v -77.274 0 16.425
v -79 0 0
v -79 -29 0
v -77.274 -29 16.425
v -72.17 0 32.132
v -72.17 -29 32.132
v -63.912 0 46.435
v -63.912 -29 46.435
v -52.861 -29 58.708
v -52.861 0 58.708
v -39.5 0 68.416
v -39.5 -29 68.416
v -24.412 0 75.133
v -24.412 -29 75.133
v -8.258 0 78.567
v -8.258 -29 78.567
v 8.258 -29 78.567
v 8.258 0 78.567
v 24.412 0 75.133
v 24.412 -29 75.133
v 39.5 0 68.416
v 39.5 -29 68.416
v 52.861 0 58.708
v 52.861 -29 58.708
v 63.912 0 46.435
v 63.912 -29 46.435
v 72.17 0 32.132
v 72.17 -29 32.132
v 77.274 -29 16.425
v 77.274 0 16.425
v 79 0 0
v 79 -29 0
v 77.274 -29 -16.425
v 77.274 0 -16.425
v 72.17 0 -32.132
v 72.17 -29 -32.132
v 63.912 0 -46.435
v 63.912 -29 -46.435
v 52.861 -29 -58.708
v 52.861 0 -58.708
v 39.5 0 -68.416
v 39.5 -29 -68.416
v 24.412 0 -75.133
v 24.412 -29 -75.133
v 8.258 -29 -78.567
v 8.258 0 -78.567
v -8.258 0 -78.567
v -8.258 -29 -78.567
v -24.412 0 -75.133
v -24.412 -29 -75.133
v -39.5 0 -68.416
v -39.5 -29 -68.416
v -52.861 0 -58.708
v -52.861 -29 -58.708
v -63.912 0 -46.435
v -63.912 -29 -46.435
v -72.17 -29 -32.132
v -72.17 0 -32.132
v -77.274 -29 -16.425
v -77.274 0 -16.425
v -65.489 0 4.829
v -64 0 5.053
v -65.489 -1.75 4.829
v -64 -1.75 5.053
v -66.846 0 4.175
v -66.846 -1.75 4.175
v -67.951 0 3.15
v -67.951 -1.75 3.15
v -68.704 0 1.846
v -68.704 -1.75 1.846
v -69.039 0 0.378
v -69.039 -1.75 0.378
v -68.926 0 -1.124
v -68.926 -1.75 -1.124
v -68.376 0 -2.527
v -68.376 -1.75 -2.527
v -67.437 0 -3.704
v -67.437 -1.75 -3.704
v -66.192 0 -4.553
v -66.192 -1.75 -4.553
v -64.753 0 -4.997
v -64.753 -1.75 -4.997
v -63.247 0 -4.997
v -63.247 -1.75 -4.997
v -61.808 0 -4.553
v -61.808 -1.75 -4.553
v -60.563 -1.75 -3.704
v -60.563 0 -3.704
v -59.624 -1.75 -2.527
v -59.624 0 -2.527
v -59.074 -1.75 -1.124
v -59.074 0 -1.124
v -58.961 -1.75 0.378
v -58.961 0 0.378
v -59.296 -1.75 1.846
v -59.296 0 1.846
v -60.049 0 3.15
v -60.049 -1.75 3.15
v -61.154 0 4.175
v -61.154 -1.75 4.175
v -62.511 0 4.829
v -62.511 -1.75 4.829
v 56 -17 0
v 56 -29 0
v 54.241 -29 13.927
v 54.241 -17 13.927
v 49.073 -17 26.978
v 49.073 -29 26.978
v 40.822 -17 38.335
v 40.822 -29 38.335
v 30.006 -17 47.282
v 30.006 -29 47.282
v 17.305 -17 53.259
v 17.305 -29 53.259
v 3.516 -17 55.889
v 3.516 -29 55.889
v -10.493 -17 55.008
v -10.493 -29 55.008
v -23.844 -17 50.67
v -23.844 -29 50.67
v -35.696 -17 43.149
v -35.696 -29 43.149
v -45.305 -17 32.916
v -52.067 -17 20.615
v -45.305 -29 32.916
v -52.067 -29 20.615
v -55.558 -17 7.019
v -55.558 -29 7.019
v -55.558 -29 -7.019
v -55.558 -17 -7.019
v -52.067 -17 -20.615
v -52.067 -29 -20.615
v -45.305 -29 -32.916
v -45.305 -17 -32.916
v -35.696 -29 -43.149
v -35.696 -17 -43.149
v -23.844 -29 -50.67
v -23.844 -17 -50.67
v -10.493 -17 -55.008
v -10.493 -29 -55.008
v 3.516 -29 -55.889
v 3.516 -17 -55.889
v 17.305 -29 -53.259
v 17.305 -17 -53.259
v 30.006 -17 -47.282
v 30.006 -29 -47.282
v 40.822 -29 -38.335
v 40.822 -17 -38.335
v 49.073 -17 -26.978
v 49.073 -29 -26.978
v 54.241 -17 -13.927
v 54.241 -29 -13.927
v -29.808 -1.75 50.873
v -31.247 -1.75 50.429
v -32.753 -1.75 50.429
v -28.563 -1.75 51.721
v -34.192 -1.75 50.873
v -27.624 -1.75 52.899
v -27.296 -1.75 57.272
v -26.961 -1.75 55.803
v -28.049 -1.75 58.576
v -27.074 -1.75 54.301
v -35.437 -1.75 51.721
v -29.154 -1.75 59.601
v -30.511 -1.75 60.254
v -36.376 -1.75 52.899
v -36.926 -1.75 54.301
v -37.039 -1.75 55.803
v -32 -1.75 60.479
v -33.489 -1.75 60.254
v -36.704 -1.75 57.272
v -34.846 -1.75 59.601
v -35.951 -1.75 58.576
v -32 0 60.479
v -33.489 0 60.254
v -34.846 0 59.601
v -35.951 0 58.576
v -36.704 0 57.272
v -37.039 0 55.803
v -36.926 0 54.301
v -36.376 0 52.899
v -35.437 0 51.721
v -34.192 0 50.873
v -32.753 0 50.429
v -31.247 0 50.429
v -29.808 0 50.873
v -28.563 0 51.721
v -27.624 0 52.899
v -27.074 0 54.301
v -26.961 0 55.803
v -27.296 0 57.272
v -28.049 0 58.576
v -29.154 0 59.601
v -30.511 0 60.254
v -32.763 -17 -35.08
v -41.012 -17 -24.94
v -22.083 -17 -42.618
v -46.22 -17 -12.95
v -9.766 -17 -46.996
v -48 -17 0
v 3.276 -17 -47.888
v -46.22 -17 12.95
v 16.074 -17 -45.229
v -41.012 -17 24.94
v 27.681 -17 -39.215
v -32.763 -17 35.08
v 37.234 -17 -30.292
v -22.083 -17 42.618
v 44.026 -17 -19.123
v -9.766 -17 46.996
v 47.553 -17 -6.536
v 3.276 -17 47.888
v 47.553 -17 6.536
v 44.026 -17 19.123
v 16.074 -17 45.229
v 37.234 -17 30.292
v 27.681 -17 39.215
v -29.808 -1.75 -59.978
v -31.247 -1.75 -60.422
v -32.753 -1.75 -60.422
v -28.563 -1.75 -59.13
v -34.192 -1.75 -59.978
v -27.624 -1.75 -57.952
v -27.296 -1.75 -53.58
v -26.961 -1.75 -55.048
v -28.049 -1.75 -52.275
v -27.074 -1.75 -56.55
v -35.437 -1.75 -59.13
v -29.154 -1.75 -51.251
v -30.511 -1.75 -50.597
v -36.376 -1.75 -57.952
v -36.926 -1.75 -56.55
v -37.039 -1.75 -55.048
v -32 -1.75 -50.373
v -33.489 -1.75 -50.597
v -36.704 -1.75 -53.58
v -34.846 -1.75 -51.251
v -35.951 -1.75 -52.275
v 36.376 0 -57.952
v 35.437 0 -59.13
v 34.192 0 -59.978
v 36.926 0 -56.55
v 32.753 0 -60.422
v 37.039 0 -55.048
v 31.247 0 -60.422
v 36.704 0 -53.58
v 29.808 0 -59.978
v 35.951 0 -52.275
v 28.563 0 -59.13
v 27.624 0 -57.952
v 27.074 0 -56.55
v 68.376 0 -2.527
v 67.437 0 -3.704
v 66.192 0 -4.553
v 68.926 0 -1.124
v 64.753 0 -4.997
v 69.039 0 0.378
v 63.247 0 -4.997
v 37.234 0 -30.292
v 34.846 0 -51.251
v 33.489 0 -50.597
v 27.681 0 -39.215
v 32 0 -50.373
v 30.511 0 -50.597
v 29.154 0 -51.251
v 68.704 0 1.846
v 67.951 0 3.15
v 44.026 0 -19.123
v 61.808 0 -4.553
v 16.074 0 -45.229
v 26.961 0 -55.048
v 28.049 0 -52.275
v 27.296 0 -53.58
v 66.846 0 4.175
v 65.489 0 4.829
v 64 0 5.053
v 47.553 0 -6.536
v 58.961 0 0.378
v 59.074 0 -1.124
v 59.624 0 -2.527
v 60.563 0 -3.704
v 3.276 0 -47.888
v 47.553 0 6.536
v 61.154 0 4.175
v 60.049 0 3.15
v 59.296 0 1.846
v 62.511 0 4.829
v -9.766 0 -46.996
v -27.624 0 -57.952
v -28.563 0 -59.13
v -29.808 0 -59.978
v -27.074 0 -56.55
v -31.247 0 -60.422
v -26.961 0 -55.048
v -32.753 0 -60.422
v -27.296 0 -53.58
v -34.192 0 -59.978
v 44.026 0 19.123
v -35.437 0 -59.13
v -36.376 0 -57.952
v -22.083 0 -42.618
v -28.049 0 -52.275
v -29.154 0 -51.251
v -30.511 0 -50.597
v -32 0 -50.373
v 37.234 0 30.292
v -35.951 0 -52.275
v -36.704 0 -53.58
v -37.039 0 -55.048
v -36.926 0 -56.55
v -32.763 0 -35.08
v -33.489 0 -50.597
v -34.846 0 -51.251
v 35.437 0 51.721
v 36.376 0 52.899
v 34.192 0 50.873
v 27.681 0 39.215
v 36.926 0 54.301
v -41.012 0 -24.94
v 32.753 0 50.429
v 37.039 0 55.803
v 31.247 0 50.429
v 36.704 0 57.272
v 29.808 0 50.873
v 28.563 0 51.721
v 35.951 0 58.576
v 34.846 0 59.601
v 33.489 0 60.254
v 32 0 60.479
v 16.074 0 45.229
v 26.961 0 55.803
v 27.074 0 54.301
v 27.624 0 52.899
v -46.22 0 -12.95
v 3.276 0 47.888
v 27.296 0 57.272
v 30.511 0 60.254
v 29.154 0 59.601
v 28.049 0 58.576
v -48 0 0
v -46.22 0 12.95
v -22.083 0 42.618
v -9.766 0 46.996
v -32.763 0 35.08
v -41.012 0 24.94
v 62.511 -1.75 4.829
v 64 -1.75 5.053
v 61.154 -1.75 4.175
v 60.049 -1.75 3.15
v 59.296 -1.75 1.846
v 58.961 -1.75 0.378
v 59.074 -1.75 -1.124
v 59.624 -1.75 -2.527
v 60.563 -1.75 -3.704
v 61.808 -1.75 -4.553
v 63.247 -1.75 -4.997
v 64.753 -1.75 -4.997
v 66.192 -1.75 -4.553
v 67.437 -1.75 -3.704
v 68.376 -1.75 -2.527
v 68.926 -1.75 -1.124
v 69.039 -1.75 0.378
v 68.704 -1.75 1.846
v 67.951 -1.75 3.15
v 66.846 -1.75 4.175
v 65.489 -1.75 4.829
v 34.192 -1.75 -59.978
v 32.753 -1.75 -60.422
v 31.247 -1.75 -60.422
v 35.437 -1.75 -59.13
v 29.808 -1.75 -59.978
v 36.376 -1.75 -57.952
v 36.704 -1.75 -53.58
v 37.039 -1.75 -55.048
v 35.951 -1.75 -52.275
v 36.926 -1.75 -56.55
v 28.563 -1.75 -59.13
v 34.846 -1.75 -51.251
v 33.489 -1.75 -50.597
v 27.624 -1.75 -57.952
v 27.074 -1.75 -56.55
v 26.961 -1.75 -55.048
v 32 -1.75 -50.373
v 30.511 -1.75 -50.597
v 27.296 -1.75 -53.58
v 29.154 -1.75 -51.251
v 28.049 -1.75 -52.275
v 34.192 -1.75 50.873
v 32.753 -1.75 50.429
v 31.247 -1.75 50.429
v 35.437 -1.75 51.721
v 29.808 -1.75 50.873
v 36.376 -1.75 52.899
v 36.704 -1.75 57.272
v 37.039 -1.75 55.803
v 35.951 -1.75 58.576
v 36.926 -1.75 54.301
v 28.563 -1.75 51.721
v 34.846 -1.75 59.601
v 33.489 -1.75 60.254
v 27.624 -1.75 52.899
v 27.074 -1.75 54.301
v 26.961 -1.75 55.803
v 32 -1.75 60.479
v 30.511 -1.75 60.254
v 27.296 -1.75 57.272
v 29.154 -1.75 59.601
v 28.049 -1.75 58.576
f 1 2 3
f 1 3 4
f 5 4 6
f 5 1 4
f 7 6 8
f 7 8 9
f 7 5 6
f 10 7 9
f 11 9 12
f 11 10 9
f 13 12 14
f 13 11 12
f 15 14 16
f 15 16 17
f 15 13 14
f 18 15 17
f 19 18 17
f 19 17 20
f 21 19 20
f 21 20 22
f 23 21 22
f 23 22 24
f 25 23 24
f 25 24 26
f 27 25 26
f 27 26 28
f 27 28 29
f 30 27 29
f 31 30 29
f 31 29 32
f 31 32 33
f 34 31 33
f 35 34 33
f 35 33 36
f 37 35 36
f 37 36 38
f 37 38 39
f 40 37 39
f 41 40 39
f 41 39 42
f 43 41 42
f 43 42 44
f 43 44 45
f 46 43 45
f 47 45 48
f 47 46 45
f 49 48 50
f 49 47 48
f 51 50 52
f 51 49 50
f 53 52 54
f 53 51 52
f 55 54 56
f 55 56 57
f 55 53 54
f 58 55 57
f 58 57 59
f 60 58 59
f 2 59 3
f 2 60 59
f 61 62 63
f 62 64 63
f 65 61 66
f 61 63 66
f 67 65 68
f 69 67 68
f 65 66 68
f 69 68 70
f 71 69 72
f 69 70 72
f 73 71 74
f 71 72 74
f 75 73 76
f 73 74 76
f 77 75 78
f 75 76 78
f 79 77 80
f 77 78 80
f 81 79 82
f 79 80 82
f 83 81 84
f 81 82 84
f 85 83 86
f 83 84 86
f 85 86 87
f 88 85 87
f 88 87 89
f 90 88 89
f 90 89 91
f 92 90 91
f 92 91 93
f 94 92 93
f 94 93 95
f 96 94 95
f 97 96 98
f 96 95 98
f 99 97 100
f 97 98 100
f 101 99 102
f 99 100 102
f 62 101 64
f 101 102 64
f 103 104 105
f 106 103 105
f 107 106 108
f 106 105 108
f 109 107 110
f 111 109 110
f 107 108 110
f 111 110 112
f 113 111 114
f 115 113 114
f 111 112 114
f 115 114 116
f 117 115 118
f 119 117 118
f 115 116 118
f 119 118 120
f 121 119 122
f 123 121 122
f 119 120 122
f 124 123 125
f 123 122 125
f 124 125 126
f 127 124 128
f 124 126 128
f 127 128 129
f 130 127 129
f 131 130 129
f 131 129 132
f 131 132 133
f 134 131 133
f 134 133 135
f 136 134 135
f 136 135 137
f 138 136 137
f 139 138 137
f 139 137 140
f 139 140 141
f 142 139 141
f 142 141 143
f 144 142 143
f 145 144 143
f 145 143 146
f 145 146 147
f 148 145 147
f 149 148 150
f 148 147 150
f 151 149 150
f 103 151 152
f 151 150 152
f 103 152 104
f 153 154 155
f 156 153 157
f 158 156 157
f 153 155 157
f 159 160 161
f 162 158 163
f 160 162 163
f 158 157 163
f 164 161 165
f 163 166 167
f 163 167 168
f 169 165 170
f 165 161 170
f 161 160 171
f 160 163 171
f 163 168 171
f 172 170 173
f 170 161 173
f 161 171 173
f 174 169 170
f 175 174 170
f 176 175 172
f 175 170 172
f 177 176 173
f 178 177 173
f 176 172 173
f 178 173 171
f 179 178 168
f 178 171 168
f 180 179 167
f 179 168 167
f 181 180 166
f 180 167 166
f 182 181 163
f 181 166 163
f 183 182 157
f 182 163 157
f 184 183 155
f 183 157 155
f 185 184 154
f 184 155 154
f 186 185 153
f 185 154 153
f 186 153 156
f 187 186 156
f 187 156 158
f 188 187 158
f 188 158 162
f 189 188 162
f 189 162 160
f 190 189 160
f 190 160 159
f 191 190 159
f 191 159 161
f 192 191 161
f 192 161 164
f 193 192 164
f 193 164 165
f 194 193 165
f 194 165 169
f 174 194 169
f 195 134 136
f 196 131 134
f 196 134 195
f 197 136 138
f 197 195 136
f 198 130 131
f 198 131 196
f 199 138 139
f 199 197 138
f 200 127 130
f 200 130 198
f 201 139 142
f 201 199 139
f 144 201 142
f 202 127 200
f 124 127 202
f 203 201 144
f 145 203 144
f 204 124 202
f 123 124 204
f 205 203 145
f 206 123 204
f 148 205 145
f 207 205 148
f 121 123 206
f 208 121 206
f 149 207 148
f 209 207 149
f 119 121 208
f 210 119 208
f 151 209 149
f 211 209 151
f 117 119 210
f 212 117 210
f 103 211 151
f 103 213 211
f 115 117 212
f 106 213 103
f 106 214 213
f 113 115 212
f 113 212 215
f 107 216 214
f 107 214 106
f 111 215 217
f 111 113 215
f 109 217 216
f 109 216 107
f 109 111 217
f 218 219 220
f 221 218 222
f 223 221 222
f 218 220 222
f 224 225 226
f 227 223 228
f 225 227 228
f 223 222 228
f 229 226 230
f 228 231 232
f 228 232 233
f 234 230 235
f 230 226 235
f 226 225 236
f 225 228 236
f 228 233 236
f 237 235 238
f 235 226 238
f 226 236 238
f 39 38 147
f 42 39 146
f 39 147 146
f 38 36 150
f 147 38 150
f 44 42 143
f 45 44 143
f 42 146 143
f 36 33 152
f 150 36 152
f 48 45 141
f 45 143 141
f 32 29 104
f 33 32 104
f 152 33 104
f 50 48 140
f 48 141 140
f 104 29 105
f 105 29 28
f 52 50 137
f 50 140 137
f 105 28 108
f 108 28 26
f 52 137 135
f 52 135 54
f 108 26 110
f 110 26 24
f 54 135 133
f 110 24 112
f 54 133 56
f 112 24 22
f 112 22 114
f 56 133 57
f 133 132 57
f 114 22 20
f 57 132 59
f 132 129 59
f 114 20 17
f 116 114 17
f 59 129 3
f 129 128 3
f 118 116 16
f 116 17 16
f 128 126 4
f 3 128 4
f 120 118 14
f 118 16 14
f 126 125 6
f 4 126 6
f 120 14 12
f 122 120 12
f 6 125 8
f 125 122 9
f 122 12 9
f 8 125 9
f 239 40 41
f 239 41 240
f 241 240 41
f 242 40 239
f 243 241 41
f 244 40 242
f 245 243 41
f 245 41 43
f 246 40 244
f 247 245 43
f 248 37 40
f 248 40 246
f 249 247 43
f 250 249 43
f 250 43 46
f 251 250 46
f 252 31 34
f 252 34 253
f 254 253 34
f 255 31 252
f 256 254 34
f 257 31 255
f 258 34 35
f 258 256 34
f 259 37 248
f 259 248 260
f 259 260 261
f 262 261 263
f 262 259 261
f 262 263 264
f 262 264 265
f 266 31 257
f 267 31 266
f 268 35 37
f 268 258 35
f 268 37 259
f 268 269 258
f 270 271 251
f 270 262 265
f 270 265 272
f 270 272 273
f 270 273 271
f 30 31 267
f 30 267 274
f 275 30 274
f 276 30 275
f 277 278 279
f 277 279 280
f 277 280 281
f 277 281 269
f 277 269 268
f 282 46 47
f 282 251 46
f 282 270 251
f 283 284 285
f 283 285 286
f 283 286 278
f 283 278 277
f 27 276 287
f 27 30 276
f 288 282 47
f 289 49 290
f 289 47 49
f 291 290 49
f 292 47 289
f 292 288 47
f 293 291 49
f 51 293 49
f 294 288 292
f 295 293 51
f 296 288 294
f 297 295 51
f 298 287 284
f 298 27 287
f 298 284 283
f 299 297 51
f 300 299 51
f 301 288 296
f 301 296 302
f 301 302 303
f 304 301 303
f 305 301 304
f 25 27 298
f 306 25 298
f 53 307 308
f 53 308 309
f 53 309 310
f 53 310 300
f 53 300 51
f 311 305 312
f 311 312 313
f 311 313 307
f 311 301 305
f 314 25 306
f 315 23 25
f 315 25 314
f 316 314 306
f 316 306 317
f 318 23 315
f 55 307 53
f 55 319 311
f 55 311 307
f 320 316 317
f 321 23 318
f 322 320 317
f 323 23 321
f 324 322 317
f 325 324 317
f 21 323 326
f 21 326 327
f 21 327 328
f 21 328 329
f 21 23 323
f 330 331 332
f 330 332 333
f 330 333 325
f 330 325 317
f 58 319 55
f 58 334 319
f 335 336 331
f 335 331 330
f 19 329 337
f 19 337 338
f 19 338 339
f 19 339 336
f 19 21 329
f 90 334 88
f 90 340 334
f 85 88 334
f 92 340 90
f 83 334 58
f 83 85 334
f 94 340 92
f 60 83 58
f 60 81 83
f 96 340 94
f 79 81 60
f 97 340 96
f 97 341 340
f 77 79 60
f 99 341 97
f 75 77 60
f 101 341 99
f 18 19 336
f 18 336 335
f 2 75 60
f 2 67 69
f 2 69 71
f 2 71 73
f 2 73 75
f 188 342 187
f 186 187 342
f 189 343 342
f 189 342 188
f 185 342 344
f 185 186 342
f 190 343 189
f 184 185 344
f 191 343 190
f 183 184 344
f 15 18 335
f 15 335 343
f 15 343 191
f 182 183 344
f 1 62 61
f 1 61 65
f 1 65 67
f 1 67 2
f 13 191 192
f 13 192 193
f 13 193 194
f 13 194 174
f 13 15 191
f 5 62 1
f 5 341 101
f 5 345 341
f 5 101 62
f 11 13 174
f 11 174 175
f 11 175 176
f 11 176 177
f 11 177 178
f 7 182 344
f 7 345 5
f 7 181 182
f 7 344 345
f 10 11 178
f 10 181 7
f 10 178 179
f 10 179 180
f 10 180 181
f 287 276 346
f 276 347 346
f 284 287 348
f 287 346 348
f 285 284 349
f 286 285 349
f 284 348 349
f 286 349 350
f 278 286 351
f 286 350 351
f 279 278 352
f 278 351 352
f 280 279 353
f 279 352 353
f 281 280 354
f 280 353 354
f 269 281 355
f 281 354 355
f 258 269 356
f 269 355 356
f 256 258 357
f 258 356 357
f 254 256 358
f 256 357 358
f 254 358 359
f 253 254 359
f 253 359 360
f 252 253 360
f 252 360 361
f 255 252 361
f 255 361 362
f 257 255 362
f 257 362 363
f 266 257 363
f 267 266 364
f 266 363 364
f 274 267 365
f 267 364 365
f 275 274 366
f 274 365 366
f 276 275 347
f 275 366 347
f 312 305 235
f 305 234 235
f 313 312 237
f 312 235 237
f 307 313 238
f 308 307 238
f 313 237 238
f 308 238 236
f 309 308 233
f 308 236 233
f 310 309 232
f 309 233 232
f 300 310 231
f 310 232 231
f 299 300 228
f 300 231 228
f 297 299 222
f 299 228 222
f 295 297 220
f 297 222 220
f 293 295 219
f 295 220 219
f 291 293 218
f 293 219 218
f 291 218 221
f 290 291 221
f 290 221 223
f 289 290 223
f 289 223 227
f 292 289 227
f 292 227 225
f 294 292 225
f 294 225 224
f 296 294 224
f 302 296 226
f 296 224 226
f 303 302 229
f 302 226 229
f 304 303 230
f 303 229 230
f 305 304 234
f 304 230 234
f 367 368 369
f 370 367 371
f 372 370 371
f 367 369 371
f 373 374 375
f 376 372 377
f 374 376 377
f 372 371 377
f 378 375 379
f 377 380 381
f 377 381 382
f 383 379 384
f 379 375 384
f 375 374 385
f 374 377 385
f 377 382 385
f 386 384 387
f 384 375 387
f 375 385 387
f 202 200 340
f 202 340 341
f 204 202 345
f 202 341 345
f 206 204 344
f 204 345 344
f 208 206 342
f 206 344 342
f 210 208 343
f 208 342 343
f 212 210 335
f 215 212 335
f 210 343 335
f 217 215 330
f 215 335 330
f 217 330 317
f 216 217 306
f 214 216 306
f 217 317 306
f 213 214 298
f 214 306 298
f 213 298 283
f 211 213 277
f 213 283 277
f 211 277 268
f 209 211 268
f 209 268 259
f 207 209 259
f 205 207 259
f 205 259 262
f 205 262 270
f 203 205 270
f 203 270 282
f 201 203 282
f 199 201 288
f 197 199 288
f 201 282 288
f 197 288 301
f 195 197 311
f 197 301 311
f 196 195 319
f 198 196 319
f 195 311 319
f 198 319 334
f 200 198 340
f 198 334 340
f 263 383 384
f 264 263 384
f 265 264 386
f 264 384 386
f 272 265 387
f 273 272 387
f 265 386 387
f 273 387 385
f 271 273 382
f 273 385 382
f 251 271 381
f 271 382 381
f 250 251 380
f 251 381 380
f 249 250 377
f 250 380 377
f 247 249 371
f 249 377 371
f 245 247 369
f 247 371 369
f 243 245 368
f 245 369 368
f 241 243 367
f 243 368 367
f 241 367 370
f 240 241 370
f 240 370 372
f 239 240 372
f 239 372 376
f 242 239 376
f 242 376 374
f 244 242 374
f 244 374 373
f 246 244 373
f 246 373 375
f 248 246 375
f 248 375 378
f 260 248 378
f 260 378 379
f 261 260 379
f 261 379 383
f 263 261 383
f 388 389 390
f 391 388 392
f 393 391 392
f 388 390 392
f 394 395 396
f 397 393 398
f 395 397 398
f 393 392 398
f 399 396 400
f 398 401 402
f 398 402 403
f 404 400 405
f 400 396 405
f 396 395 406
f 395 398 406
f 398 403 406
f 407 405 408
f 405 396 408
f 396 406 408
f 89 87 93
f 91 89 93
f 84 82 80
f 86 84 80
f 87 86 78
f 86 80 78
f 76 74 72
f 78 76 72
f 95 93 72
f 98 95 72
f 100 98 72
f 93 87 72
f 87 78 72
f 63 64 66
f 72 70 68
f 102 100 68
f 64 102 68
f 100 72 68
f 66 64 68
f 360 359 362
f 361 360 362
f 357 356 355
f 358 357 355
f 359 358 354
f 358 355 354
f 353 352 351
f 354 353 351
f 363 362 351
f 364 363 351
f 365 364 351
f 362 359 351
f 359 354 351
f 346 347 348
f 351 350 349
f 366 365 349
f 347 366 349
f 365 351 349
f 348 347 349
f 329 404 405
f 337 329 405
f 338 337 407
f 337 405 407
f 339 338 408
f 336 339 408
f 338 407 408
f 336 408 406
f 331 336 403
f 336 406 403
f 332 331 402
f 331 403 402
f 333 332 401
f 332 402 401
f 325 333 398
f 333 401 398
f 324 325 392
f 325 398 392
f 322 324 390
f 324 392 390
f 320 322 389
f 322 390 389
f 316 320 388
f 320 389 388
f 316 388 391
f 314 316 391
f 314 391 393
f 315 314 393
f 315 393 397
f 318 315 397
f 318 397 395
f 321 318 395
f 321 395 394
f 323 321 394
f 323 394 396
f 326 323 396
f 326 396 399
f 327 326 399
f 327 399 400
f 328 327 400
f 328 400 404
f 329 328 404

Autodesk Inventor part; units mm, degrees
ref_plane "YZ Plane" through (0, 0, 0) normal (1, 0, 0) x (0, 1, 0)
ref_plane "XZ Plane" through (0, 0, 0) normal (0, 1, 0) x (-1, 0, 0)
ref_plane "XY Plane" through (0, 0, 0) normal (0, 0, 1) x (1, 0, 0)
sketch "Boceto1" plane through (0, 0, 0) normal (0, 1, 0) x (-1, 0, 0)
  circle A0 centre (0, 0) radius 79
  circle A1 centre (0, 0) radius 48
  dimension "d0" = 158
  dimension "d1" = 96
extrude "Extrusión1" add sketch "Boceto1" against normal blind 29
sketch "Boceto2" plane through (0, -29, 0) normal (0, -1, 0) x (1, 0, 0)
  circle A0 centre (0, 0) radius 56
  dimension "d4" = 112
extrude "Extrusión2" cut sketch "Boceto2" against normal blind 12
sketch "Boceto3" plane through (0, 0, 0) normal (0, 1, 0) x (1, 0, 0)
  circle A0 centre (0, 0) radius 64 construction
  circle A1 centre (0, 0) radius 48 projected
  line L0 (0, 0) -> (64, 0) construction
  point P0 (32, 55.4256)
  point P1 (-32, 55.4256)
  point P2 (-64, 0)
  point P3 (-32, -55.4256)
  point P4 (32, -55.4256)
  dimension "d7" = 128
  dimension "d10" = 360
hole "Agujero1" at (64, 0, 0) at (32, 0, -55.4256) at (-32, 0, -55.4256) at (-64, 0, 0) at (-32, 0, 55.4256) at (32, 0, 55.4256) direction (0, -1, 0) diameter 10.106 depth 1.75 thread size "M12x1.75" class "6H" standard "ISO Metric profile"
properties part number "4_AnilloComplementarioB"
